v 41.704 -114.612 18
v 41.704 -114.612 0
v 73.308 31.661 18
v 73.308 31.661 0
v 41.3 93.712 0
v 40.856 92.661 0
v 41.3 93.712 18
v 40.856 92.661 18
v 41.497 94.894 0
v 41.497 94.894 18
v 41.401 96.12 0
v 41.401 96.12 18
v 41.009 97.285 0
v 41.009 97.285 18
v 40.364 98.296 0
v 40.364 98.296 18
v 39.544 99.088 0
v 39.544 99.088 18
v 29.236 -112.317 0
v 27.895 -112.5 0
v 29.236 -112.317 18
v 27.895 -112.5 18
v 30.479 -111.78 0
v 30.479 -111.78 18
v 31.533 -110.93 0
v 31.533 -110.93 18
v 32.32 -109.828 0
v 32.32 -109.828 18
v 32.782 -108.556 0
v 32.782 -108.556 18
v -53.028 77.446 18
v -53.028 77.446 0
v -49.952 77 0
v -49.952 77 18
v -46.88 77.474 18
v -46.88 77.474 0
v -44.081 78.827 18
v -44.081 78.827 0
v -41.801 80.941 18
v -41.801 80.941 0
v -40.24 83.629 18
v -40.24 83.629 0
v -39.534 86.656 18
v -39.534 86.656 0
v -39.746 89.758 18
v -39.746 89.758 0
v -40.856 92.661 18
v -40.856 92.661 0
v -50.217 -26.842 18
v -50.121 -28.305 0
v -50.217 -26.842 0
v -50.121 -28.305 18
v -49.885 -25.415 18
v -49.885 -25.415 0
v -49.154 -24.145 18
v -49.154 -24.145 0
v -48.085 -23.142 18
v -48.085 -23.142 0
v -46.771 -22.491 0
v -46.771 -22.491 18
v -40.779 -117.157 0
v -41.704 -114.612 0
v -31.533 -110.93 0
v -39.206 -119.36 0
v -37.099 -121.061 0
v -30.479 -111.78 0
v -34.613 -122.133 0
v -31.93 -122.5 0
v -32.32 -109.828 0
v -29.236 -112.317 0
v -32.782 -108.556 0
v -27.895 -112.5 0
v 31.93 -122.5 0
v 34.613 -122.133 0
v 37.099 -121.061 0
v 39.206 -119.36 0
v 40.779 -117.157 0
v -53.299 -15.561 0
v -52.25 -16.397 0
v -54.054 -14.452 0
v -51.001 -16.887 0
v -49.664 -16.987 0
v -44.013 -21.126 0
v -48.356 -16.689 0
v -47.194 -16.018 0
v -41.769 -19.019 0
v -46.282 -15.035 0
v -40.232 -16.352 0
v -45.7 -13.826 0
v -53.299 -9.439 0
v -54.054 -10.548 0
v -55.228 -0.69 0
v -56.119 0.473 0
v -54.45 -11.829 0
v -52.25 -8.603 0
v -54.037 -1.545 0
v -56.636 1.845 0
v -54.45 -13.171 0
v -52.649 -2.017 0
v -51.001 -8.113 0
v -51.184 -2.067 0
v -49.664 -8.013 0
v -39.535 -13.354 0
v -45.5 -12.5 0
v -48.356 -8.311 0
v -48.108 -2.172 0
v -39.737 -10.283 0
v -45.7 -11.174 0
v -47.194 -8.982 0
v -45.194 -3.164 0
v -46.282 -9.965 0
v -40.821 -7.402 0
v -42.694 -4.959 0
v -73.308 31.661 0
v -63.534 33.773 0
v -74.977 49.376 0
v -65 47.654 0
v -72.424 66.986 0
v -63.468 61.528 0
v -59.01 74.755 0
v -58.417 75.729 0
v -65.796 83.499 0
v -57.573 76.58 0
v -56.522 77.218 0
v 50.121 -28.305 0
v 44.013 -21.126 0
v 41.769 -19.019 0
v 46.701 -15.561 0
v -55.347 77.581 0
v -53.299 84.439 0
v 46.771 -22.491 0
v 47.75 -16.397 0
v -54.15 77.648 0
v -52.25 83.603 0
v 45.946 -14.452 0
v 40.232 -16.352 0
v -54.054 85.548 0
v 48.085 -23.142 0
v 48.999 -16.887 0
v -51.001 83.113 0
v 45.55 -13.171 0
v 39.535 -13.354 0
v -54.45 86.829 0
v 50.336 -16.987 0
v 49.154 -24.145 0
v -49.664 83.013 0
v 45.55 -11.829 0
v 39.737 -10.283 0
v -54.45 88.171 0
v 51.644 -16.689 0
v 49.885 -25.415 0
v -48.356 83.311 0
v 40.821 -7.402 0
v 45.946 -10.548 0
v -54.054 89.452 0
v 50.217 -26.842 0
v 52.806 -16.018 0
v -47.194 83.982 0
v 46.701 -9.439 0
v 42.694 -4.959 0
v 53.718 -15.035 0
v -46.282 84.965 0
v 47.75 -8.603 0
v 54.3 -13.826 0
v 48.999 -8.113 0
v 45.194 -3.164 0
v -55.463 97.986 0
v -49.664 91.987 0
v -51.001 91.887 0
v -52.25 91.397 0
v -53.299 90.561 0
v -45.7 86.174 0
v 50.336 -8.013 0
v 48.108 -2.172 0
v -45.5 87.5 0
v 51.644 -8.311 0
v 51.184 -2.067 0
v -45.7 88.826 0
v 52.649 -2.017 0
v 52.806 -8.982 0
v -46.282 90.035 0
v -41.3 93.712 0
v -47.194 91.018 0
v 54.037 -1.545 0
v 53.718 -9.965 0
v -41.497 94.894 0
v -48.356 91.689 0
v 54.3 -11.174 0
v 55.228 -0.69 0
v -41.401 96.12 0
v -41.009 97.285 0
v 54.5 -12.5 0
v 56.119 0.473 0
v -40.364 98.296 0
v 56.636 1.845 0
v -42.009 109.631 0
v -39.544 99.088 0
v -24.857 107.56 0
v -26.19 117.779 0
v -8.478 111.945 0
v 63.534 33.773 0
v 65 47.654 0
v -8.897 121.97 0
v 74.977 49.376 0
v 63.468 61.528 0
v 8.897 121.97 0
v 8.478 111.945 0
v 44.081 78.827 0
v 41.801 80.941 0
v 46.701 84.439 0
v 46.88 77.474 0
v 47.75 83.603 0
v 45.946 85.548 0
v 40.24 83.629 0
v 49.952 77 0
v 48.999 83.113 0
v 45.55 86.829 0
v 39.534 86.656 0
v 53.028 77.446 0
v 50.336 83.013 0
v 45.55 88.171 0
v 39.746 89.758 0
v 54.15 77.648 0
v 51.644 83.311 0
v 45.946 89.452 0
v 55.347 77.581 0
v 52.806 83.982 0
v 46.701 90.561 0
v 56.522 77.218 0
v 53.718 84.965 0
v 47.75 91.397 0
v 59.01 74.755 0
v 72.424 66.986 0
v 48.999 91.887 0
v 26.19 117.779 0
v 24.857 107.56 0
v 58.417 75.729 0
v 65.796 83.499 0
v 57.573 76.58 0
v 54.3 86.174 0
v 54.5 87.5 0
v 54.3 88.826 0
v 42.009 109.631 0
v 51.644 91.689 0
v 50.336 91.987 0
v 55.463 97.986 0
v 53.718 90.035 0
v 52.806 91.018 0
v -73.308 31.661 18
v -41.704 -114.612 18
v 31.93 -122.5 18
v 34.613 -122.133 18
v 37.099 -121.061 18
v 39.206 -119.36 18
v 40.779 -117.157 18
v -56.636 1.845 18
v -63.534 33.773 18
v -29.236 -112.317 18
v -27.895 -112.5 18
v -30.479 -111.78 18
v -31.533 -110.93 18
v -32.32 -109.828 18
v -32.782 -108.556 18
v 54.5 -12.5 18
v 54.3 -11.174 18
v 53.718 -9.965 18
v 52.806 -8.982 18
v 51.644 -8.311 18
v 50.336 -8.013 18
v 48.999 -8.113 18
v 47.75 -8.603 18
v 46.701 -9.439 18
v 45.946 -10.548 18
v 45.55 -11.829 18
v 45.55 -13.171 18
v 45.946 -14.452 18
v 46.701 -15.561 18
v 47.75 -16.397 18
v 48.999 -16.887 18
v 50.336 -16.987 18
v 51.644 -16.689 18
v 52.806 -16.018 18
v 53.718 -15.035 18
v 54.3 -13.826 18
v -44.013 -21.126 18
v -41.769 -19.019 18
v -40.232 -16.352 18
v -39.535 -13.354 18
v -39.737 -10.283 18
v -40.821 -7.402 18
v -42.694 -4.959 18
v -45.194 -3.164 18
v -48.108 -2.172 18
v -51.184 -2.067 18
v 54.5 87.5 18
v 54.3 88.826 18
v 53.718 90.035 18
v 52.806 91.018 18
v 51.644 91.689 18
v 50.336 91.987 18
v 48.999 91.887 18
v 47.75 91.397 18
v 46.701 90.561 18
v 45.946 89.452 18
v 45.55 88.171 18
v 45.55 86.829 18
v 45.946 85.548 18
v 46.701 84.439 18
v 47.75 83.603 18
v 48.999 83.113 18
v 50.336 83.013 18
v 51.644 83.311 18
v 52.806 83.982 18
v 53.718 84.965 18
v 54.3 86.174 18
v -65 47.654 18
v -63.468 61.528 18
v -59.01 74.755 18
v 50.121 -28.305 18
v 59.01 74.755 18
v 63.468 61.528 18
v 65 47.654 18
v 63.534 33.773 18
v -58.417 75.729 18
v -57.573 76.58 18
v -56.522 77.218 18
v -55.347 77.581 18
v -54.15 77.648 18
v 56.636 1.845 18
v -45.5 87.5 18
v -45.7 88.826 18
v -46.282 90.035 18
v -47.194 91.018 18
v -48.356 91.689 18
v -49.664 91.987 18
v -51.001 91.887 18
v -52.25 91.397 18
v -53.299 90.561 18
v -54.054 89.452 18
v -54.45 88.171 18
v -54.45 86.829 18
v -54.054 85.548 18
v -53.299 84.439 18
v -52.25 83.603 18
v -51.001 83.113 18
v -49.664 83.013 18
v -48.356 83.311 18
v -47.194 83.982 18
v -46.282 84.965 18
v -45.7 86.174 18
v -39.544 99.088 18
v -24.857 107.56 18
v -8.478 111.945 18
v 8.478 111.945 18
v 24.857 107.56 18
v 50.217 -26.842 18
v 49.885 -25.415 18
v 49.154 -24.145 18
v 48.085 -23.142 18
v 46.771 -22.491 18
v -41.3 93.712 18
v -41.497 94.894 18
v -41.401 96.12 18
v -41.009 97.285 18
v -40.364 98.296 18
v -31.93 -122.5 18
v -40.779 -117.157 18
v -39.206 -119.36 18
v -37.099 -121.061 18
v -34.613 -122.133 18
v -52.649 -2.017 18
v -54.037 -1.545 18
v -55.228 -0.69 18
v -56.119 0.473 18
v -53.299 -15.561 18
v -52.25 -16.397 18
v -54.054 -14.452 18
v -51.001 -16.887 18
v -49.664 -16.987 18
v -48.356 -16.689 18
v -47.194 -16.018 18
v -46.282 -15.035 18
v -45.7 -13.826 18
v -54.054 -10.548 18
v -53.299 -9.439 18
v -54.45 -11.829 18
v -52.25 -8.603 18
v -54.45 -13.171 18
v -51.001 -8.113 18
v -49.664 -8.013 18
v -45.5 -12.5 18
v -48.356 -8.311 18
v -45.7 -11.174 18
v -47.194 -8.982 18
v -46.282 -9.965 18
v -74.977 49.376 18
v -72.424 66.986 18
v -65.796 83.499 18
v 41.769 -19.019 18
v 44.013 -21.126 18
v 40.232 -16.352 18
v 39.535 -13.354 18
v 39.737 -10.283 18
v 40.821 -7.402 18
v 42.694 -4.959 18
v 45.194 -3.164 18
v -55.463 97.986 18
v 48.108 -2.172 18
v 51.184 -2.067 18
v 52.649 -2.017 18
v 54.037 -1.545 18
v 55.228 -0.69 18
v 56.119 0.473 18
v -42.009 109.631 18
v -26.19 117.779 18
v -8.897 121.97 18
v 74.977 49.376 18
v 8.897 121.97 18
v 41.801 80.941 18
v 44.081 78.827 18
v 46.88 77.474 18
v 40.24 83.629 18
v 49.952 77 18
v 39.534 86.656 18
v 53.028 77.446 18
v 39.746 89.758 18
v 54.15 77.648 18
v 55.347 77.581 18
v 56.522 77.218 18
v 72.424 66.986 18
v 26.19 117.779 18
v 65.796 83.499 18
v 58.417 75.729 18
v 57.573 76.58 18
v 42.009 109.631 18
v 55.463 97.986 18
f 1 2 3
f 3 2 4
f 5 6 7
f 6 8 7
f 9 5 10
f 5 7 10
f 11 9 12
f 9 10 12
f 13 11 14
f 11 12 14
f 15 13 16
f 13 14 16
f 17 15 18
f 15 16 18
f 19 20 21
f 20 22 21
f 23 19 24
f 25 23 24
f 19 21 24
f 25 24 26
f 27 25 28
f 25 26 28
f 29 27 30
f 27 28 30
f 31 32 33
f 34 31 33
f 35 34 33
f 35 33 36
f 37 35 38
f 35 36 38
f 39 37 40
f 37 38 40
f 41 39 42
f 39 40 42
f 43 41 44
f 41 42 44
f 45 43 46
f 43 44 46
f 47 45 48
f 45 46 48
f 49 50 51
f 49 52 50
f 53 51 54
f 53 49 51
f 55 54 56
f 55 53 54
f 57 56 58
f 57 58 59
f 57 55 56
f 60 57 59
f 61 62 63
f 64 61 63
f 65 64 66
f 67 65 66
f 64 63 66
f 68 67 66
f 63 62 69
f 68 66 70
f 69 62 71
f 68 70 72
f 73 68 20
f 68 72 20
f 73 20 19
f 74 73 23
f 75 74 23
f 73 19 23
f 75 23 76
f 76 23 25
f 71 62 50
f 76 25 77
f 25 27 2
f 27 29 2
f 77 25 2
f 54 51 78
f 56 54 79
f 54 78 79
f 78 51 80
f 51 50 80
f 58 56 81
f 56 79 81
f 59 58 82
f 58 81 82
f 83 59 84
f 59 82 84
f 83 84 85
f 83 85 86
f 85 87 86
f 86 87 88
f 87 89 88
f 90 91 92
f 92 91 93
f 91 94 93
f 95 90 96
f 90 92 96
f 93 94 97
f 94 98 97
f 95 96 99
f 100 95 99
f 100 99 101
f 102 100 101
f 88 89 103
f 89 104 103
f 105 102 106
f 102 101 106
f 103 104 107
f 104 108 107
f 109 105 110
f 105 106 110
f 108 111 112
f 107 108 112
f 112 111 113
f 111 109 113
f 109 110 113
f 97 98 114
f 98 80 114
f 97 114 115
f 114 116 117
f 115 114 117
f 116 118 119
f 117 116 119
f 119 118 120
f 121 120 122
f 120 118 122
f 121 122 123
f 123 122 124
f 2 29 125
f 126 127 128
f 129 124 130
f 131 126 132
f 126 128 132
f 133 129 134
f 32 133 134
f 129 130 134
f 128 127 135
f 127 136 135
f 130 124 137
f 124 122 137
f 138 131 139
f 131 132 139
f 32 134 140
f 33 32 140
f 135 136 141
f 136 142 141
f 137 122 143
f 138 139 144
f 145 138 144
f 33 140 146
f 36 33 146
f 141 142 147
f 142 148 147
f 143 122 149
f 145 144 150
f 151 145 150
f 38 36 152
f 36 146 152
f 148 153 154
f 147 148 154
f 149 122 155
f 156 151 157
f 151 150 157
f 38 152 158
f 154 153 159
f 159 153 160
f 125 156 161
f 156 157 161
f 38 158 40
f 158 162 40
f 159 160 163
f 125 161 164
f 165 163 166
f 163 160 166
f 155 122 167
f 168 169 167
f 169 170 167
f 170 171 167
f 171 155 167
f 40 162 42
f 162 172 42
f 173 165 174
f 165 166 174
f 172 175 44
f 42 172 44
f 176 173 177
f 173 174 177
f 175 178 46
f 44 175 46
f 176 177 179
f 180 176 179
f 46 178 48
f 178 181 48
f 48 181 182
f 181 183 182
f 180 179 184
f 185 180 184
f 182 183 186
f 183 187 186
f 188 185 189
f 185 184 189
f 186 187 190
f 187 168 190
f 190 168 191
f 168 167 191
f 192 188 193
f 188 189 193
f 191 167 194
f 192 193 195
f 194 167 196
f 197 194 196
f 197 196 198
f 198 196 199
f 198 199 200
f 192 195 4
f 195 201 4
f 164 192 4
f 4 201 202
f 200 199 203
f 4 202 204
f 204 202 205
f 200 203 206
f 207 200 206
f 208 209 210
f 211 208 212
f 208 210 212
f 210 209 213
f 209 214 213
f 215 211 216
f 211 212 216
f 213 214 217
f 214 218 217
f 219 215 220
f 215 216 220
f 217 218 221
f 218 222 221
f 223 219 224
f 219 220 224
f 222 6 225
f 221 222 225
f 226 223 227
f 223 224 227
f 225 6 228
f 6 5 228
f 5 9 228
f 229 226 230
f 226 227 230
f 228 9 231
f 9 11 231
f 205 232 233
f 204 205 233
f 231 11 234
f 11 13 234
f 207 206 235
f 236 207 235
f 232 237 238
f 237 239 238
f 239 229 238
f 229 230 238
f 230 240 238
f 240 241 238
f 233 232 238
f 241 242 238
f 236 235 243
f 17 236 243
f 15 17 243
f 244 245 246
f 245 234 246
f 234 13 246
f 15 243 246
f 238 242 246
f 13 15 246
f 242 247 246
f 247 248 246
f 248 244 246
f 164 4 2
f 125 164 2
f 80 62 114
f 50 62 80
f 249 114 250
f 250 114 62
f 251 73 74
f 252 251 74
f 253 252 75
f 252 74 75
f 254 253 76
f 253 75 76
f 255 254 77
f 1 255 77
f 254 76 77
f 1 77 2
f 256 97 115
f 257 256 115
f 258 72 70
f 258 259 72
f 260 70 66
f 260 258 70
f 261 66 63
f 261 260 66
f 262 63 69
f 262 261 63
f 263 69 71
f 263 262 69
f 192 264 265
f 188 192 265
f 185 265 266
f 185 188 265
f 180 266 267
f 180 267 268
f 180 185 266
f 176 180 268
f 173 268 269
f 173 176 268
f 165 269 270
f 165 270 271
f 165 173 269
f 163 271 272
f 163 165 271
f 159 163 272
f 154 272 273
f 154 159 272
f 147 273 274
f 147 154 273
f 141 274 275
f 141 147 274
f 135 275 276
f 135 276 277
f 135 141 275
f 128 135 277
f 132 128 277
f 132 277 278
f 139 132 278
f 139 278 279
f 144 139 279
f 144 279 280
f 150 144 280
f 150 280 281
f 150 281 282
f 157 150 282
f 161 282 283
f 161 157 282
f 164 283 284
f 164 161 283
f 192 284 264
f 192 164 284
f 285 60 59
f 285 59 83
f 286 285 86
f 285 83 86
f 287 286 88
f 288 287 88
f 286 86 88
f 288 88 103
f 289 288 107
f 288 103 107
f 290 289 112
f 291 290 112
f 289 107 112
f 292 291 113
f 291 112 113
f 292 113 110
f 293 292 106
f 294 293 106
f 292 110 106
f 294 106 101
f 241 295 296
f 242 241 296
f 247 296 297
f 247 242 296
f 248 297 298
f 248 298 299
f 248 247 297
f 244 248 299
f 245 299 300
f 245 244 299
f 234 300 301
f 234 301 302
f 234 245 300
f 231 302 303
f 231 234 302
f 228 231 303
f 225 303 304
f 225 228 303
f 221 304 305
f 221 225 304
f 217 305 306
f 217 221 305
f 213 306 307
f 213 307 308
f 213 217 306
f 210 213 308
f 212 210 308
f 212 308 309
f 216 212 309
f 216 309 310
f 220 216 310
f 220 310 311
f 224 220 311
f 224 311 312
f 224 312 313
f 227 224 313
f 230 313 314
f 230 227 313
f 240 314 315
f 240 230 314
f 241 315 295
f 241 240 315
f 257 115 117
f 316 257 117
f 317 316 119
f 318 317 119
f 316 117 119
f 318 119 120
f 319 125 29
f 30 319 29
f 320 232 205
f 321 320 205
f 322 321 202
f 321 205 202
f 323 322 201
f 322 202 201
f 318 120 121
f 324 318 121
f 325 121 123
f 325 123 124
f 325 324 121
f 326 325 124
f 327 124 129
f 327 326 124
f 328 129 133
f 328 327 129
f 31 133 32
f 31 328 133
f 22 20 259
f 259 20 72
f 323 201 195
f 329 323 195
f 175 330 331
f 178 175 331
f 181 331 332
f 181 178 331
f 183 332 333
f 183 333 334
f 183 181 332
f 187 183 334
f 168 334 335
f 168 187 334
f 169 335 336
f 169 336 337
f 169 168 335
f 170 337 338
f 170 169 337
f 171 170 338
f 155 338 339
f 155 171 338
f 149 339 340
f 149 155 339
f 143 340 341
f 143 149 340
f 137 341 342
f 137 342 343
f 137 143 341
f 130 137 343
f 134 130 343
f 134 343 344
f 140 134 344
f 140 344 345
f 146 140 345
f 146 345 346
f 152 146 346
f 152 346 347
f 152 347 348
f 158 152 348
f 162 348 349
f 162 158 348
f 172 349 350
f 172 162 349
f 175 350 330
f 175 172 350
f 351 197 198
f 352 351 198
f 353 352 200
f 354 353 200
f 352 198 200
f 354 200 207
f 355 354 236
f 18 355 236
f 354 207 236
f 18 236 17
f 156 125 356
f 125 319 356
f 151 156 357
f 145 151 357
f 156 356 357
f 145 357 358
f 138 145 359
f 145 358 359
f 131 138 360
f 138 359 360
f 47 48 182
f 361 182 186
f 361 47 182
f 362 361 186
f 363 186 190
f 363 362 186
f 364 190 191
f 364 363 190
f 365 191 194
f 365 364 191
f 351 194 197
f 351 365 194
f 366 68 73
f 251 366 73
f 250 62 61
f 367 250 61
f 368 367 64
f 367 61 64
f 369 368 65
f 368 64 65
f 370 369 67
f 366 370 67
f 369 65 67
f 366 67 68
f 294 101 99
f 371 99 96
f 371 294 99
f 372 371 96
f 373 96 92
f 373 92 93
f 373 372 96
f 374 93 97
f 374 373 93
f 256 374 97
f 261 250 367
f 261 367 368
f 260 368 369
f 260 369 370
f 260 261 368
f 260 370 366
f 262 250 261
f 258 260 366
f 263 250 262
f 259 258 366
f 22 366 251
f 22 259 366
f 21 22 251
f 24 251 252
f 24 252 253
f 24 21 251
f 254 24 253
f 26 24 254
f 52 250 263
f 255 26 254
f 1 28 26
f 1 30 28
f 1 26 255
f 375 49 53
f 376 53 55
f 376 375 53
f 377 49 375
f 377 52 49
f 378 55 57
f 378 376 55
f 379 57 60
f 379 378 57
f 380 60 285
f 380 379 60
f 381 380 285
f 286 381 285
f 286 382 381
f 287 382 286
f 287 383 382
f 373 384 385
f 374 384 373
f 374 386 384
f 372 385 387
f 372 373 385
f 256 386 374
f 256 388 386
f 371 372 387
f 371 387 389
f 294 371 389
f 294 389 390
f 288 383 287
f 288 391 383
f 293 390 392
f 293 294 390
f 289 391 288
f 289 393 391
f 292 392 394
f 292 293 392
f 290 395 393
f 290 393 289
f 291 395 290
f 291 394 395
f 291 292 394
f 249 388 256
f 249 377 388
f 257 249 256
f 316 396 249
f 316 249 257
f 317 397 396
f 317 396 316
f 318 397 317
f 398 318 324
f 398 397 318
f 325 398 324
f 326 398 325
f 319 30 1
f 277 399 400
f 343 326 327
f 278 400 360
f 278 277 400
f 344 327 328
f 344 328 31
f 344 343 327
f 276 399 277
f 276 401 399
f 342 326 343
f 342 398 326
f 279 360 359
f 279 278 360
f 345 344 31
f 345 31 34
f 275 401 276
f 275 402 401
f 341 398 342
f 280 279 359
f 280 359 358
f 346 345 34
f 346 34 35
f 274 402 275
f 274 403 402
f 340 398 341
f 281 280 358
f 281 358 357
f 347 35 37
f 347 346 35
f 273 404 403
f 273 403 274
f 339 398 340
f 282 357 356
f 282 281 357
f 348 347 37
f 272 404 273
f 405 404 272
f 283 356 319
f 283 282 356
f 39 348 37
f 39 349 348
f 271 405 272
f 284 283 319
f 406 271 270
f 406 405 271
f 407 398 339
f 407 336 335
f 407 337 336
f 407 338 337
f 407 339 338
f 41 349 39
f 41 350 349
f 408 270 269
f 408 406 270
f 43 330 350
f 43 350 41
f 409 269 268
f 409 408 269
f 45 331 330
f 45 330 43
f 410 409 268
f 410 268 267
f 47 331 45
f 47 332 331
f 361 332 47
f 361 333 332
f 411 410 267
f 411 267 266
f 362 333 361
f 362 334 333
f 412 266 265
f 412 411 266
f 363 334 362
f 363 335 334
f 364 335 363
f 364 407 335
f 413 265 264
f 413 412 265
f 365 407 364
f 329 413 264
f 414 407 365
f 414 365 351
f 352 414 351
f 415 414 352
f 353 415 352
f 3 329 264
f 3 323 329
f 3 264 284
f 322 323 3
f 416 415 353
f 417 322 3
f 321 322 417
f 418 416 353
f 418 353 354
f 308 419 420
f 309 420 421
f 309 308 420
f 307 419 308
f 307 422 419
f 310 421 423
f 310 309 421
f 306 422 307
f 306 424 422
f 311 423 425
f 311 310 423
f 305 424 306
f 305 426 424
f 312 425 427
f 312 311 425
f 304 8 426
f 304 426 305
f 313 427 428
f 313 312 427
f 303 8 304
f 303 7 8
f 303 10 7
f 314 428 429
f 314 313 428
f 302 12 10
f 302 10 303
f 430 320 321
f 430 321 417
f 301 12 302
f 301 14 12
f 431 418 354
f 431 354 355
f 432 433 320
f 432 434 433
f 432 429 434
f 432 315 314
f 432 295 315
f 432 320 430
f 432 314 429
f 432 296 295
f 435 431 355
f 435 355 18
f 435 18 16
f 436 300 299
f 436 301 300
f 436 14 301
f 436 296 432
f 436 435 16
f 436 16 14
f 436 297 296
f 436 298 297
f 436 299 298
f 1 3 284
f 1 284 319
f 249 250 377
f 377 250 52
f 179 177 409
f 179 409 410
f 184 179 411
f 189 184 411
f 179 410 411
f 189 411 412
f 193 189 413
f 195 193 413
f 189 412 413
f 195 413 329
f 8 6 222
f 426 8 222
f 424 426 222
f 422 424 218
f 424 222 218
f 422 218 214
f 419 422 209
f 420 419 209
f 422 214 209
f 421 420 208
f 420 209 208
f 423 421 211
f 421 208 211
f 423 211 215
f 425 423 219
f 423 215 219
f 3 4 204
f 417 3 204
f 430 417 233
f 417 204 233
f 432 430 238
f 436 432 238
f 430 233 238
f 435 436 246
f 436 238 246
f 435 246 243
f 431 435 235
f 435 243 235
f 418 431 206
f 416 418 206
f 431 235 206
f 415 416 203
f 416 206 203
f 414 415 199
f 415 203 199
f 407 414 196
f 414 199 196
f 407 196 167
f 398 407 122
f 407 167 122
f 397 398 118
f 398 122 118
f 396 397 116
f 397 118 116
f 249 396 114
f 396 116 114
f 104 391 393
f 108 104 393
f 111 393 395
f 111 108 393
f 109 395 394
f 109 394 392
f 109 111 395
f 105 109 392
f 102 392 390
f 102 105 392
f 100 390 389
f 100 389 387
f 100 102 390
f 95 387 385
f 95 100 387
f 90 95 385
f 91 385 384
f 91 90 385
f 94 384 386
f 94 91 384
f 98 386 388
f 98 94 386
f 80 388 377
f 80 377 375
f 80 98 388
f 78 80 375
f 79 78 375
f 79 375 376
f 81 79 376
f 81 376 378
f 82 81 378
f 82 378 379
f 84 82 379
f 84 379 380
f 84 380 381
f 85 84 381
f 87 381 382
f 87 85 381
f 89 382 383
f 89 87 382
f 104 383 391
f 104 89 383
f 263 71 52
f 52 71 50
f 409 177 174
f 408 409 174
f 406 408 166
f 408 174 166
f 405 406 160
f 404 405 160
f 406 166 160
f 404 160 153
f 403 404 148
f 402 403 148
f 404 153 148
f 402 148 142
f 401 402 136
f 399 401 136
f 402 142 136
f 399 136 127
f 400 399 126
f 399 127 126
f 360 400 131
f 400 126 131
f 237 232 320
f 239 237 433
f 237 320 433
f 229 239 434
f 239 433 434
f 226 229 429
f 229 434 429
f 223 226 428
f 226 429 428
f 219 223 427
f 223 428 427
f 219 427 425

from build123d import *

# Parameters (mm, degrees)
SKETCH3_R           = 4.5
BOSS_EXTRUDE1_DEPTH = 18
FILLET1_R           = 5
FILLET2_R           = 5


with BuildPart() as part:
    # Sketch3 → Boss-Extrude1 (new body)
    with BuildSketch(Plane.XY):
        with BuildLine():
            Line((-31.929873349, -122.5), (31.929873349, -122.5))
            ThreePointArc((31.929873349, -122.5), (38.210043039, -120.281996444), (41.704324989, -114.611893732))
            Line((41.704324989, -114.611893732), (73.308387301, 31.660797012))
            ThreePointArc((73.308387301, 31.660797012), (0, 122.5), (-73.308387301, 31.660797012))
            Line((-73.308387301, 31.660797012), (-41.704324989, -114.611893732))
            ThreePointArc((-41.704324989, -114.611893732), (-38.210043039, -120.281996444), (-31.929873349, -122.5))
        make_face()
        with Locations((50, -12.5)):
            Circle(SKETCH3_R, mode=Mode.SUBTRACT)
        with Locations((50, 87.5)):
            Circle(SKETCH3_R, mode=Mode.SUBTRACT)
        with Locations((-50, 87.5)):
            Circle(SKETCH3_R, mode=Mode.SUBTRACT)
        with Locations((-50, -12.5)):
            Circle(SKETCH3_R, mode=Mode.SUBTRACT)
        with BuildLine():
            Line((-31.929873349, -112.5), (-51.284518999, -22.921132901))
            ThreePointArc((-51.284518999, -22.921132901), (-39.736825778, -10.282511582), (-55.472323677, -3.538768301))
            Line((-55.472323677, -3.538768301), (-63.533935661, 33.772690744))
            ThreePointArc((-63.533935661, 33.772690744), (-64.271528905, 57.204152316), (-56.648842383, 79.373322021))
            ThreePointArc((-56.648842383, 79.373322021), (-41.800877501, 80.940702001), (-43.531035666, 95.770580418))
            ThreePointArc((-43.531035666, 95.770580418), (0, 112.5), (43.531035666, 95.770580418))
            ThreePointArc((43.531035666, 95.770580418), (41.800877501, 80.940702001), (56.648842383, 79.373322021))
            ThreePointArc((56.648842383, 79.373322021), (64.271528905, 57.204152316), (63.533935661, 33.772690744))
            Line((63.533935661, 33.772690744), (55.472323677, -3.538768301))
            ThreePointArc((55.472323677, -3.538768301), (39.736825778, -10.282511582), (51.284518999, -22.921132901))
            Line((51.284518999, -22.921132901), (31.929873349, -112.5))
            Line((31.929873349, -112.5), (-31.929873349, -112.5))
        make_face(mode=Mode.SUBTRACT)
    extrude(amount=BOSS_EXTRUDE1_DEPTH)

    # Fillet1
    fillet1_edges = [part.edges().sort_by_distance(p)[0] for p in [
        (-31.929873349, -112.5, 9),
        (31.929873349, -112.5, 9),
    ]]
    fillet(fillet1_edges, radius=FILLET1_R)

    # Fillet2
    fillet2_edges = [part.edges().sort_by_distance(p)[0] for p in [
        (51.284518999, -22.921132901, 9),
        (55.472323677, -3.538768301, 9),
        (56.648842383, 79.373322021, 9),
        (43.531035666, 95.770580418, 9),
        (-43.531035666, 95.770580418, 9),
        (-56.648842383, 79.373322021, 9),
        (-55.472323677, -3.538768301, 9),
        (-51.284518999, -22.921132901, 9),
    ]]
    fillet(fillet2_edges, radius=FILLET2_R)


solid = part.part
